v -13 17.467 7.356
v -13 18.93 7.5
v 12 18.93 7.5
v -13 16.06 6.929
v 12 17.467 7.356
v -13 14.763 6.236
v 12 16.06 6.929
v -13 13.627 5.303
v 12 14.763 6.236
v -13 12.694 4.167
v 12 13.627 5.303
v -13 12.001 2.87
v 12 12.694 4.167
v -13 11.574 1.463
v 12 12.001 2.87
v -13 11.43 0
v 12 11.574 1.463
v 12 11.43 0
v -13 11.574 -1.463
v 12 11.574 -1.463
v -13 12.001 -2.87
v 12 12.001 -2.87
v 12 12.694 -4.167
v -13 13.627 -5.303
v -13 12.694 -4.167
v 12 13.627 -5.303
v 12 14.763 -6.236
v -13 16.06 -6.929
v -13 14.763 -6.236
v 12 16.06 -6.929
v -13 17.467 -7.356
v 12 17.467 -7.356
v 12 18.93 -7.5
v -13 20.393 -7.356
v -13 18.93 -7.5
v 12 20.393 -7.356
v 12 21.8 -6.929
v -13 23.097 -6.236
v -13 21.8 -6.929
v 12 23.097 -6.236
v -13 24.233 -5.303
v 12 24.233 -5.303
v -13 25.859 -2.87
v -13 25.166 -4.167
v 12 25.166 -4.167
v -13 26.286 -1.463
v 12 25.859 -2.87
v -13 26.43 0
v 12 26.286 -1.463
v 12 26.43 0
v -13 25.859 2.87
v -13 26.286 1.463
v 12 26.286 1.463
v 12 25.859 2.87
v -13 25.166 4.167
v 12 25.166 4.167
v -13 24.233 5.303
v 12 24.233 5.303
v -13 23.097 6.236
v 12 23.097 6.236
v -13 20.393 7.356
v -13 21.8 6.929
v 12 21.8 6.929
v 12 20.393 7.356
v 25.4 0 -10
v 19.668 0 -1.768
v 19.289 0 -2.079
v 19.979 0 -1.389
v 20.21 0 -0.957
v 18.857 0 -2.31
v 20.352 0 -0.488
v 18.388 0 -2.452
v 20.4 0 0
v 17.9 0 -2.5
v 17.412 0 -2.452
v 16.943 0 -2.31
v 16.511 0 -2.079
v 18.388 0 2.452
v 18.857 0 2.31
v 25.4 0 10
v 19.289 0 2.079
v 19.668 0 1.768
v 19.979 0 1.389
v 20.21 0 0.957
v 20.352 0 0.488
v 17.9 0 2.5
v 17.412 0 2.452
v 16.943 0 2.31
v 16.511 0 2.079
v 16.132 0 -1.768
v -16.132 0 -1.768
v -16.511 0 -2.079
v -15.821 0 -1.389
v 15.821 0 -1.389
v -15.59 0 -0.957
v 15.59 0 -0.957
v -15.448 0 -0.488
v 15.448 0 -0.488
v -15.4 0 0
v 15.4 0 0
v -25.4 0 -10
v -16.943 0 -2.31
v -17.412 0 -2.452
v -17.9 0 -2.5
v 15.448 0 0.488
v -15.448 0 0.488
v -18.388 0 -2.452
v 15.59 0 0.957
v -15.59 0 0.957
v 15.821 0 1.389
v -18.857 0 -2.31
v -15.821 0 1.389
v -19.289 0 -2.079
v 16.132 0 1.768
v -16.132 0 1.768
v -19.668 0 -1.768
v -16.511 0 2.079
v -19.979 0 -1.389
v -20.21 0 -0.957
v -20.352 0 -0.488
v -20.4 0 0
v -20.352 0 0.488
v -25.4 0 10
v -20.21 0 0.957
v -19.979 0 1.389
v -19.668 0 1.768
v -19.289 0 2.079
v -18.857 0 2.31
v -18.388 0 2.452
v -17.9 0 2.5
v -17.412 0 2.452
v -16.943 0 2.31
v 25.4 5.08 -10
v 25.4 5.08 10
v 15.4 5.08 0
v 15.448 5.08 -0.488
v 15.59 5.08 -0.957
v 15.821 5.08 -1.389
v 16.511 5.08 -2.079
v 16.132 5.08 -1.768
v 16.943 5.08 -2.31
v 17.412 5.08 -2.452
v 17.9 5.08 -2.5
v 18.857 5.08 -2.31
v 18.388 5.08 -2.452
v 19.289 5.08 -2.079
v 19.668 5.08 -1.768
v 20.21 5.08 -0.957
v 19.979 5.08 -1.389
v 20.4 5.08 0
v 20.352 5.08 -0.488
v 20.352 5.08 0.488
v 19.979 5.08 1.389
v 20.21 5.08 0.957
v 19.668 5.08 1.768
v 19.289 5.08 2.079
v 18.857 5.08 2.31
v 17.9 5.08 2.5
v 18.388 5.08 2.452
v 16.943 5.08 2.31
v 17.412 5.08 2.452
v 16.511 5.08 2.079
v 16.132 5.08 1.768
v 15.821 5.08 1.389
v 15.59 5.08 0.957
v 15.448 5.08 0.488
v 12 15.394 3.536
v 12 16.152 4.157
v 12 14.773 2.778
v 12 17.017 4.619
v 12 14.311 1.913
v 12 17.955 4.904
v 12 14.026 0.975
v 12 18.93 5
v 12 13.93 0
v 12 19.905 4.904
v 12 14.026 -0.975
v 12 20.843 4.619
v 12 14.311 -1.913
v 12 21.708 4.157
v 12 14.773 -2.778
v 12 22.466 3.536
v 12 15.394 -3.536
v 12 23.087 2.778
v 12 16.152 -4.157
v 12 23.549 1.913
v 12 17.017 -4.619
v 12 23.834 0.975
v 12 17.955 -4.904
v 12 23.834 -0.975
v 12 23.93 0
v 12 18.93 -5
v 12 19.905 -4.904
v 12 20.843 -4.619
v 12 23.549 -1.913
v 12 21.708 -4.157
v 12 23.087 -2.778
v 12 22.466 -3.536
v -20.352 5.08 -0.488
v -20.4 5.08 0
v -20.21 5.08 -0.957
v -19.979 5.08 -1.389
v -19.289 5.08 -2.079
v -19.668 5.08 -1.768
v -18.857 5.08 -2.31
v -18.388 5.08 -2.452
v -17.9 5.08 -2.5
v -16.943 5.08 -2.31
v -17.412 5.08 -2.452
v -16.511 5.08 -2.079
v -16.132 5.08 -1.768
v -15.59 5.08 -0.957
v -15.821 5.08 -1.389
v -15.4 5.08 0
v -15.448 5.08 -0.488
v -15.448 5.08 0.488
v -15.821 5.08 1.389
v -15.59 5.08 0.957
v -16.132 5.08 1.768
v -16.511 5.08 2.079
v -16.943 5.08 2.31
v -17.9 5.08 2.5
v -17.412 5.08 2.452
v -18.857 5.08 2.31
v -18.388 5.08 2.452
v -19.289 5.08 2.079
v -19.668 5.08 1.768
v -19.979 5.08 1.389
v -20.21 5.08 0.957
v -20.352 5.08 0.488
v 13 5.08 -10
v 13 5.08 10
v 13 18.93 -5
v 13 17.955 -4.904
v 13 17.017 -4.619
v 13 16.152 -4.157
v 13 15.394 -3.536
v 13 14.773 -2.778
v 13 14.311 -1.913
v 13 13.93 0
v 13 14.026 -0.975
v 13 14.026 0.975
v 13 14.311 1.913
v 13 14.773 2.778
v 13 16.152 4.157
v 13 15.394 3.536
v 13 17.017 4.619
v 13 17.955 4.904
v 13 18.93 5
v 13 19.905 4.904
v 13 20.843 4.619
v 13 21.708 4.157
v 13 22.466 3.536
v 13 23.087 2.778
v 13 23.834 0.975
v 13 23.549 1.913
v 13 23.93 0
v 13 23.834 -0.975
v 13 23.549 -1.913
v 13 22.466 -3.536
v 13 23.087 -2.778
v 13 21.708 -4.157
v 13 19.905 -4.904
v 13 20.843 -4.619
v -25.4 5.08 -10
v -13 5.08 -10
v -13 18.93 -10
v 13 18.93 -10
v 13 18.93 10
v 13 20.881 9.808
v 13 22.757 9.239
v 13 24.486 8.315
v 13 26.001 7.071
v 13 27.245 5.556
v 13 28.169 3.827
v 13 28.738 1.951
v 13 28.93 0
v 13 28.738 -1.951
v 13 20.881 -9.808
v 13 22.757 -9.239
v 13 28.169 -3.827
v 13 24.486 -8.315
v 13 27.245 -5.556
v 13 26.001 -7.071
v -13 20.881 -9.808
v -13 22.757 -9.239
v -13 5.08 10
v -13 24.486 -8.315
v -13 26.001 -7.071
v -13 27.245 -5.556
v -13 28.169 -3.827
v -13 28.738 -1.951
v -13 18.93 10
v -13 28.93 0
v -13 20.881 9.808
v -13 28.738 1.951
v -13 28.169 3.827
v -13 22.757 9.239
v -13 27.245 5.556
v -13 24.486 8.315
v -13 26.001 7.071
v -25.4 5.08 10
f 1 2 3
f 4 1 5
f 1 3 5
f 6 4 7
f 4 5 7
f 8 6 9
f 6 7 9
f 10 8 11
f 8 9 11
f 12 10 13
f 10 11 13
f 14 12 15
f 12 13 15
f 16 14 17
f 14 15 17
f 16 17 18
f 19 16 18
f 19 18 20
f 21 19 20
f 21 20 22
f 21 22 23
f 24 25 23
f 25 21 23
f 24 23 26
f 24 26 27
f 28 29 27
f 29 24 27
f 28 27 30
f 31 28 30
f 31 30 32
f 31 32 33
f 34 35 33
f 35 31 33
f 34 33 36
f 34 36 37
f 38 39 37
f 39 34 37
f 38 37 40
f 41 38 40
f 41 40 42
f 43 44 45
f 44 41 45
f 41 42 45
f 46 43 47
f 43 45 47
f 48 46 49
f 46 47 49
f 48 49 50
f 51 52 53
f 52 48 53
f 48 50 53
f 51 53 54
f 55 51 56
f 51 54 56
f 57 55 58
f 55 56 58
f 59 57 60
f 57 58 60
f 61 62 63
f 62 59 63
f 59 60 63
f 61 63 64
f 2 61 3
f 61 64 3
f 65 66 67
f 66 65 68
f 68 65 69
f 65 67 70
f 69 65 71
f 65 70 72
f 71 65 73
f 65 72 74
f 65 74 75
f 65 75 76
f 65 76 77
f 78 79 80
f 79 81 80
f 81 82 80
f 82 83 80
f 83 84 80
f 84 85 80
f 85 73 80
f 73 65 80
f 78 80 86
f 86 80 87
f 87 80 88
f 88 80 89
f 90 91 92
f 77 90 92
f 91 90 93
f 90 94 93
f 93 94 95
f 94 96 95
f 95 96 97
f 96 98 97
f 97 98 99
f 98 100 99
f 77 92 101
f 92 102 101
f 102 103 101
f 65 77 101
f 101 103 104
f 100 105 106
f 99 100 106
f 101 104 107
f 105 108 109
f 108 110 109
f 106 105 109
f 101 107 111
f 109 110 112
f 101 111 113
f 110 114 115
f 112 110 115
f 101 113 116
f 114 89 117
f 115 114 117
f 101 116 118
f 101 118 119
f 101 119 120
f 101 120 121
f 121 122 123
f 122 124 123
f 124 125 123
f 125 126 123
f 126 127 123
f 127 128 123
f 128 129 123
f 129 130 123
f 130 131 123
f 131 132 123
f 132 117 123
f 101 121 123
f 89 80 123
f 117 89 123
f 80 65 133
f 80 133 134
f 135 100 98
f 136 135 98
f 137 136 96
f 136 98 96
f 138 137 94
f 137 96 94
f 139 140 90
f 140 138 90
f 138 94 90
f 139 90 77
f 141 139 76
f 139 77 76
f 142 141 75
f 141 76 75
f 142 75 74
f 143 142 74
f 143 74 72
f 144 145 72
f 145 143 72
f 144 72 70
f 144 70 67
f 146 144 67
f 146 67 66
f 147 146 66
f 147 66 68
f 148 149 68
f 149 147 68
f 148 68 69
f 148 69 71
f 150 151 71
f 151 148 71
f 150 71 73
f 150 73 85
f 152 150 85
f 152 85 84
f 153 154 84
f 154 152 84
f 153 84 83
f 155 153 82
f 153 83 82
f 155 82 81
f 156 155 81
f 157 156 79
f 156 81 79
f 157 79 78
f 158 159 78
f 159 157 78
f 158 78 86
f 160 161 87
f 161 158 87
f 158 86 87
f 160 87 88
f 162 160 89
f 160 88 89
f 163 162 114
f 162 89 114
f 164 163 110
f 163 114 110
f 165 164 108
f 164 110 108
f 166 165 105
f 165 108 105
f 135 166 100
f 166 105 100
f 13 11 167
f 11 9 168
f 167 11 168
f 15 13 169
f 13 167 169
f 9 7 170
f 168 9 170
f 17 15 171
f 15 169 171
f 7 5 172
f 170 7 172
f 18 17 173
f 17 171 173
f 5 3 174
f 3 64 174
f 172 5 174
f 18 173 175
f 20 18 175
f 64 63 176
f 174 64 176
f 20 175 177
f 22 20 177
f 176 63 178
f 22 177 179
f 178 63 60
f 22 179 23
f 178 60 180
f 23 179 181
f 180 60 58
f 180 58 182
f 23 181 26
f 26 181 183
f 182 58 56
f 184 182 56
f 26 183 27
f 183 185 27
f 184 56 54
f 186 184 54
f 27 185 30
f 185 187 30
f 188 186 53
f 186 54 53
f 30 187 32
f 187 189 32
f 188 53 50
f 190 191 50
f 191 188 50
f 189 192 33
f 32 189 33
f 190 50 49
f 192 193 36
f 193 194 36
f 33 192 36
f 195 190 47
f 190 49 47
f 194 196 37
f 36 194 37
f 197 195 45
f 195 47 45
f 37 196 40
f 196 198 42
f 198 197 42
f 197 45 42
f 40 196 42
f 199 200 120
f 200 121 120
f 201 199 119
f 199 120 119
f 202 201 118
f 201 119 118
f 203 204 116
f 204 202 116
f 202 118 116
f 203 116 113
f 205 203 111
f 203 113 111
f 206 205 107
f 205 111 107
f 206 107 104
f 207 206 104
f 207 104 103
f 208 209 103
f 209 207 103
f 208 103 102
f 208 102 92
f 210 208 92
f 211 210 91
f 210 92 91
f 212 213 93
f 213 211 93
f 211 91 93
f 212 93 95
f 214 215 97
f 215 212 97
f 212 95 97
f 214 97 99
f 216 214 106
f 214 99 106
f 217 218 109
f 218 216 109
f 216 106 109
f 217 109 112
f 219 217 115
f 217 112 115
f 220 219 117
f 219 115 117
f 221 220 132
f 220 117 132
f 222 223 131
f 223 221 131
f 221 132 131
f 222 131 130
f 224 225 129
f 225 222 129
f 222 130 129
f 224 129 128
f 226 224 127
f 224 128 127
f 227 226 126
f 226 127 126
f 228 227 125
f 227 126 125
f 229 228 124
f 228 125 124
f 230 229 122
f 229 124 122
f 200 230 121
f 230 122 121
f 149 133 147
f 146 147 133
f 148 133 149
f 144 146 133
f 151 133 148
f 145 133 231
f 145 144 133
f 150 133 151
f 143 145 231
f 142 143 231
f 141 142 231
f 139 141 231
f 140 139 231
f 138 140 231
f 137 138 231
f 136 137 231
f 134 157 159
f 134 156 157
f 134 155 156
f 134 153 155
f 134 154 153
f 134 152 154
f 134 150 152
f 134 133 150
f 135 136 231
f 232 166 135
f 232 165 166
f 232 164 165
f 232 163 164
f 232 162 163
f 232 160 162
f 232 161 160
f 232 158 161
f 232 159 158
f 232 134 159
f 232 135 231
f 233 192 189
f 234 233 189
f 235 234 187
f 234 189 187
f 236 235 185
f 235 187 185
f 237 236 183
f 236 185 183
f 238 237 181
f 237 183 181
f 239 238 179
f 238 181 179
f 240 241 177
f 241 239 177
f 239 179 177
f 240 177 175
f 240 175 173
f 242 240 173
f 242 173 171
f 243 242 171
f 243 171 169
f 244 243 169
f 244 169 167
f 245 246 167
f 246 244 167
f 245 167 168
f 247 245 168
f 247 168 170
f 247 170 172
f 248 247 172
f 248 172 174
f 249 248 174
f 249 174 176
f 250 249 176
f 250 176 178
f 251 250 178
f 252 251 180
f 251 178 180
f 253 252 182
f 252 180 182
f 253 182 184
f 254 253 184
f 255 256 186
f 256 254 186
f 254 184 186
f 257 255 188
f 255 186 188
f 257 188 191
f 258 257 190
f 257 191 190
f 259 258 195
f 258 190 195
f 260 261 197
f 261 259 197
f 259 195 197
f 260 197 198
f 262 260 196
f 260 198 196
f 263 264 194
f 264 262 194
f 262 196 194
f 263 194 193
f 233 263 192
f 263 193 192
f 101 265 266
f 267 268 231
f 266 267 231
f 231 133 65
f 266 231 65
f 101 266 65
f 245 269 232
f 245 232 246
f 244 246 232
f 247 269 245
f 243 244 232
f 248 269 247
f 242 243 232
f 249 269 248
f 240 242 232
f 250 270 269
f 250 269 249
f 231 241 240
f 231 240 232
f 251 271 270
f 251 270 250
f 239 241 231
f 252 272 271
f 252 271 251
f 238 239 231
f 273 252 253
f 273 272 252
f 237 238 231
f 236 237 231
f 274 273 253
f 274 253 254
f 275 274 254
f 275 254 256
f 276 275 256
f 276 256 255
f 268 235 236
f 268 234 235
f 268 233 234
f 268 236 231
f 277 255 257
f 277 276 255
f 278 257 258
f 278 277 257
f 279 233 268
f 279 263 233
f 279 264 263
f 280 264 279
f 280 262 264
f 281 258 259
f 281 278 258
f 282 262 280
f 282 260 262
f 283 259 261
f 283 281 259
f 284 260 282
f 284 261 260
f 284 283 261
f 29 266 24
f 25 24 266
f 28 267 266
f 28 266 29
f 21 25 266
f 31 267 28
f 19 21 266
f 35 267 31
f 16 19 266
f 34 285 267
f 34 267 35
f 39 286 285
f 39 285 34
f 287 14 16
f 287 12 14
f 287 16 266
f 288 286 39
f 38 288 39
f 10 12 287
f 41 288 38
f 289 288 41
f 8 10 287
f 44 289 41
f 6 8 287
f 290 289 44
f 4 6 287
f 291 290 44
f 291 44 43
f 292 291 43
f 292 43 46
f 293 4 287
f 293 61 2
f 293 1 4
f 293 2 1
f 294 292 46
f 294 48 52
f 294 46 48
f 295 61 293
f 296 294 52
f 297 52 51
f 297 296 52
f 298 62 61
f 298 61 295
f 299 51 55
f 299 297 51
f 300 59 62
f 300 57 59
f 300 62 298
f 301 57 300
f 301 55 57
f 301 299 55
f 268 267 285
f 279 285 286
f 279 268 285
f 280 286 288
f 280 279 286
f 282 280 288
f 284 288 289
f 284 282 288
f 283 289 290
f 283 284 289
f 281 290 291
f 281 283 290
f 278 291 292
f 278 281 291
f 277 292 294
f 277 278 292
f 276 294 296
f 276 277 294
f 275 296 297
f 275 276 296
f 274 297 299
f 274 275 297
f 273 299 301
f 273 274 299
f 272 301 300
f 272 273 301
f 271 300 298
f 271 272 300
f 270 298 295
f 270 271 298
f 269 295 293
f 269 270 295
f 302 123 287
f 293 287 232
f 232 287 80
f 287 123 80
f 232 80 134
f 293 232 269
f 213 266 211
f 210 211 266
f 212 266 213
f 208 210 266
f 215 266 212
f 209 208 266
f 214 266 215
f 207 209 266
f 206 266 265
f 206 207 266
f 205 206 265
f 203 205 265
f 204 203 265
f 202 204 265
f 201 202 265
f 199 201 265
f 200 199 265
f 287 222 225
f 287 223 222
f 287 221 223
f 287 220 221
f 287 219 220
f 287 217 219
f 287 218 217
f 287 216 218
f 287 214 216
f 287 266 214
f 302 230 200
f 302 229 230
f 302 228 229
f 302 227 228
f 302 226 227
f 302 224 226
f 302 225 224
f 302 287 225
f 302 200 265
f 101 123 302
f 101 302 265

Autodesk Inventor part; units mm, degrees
ref_plane "YZ Plane" through (0, 0, 0) normal (1, 0, 0) x (0, 1, 0)
ref_plane "XZ Plane" through (0, 0, 0) normal (0, 1, 0) x (-1, 0, 0)
ref_plane "XY Plane" through (0, 0, 0) normal (0, 0, 1) x (1, 0, 0)
sketch "Sketch1" plane through (0, 0, 0) normal (0, 1, 0) x (-1, 0, 0)
  line L0 (25.4, -10) -> (-25.4, -10)
  line L1 (-25.4, -10) -> (-25.4, 10)
  line L2 (-25.4, 10) -> (25.4, 10)
  line L3 (25.4, 10) -> (25.4, -10)
  line L4 (25.4, -10) -> (-25.4, 10) construction
  line L5 (-25.4, -10) -> (25.4, 10) construction
  circle A0 centre (-17.9, 0) radius 2.5
  circle A1 centre (17.9, 0) radius 2.5
  point P0 (0, 0)
  dimension "d0" = 50.8
  dimension "d1" = 20
  dimension "d2" = 5
  dimension "d3" = 5
  dimension "d4" = 7.5
  dimension "d5" = 7.5
extrude "Extrusion1" add sketch "Sketch1" along normal blind 5.08
ref_plane "Work Plane1" through (0, 0, -10) normal (-1, 0, 0) x (0, 0, 1)
sketch "Sketch2" plane through (0, 0, -10) normal (-1, 0, 0) x (0, 0, 1)
  line L0 (0, 0) -> (20, 0) projected
  line L1 (0, 0) -> (0, 5.08) projected
  line L2 (20, 5.08) -> (0, 5.08) projected
  line L3 (20, 0) -> (20, 5.08) projected
  line L4 (0, 5.08) -> (20, 5.08) projected
  line L5 (10, 0) -> (10, 2.54)
  line L6 (10, 5.08) -> (10, 11.43)
  line L7 (10, 11.43) -> (10, 18.93)
  circle A0 centre (10, 18.93) radius 7.5
  line L8 (20, 5.08) -> (20, 18.93)
  line L9 (0, 5.08) -> (0, 18.93)
  arc A1 (20, 18.93) -> (0, 18.93) centre (10, 18.93) ccw
  line L10 (20, 18.93) -> (20, 5.08)
  line L11 (20, 5.08) -> (0, 5.08)
  line L12 (0, 5.08) -> (0, 18.93)
  dimension "d10" = 2.54
  dimension "d11" = 6.35
  dimension "d12" = 7.5
  dimension "d13" = 15
extrude "Extrusion2" add sketch "Sketch2" along normal mid plane 24 contours L9 A1 L8 L2
sketch "Sketch3" plane through (12, 0, -10) normal (1, 0, 0) x (0, 0, -1)
  circle A0 centre (-10, 18.93) radius 7.5 projected
  line L0 (0, 5.08) -> (-20, 5.08) projected
  line L1 (0, 5.08) -> (0, 18.93) projected
  arc A1 (0, 18.93) -> (-20, 18.93) centre (-10, 18.93) ccw projected
  line L2 (-20, 18.93) -> (-20, 5.08) projected
  circle A2 centre (-10, 18.93) radius 5
  point P0 (-10, 0)
  dimension "d16" = 10
extrude "Extrusion3" add sketch "Sketch3" along normal blind 1 contours A0 | L0 L2 A1 L1
sketch "Sketch4" plane through (-12, 0, -10) normal (-1, 0, 0) x (0, 0, 1)
  circle A0 centre (10, 18.93) radius 7.5 projected
  line L0 (20, 5.08) -> (0, 5.08) projected
  line L1 (20, 5.08) -> (20, 18.93) projected
  arc A1 (20, 18.93) -> (0, 18.93) centre (10, 18.93) ccw projected
  line L2 (0, 18.93) -> (0, 5.08) projected
  point P0 (10, 0)
extrude "Extrusion4" add sketch "Sketch4" along normal blind 1
